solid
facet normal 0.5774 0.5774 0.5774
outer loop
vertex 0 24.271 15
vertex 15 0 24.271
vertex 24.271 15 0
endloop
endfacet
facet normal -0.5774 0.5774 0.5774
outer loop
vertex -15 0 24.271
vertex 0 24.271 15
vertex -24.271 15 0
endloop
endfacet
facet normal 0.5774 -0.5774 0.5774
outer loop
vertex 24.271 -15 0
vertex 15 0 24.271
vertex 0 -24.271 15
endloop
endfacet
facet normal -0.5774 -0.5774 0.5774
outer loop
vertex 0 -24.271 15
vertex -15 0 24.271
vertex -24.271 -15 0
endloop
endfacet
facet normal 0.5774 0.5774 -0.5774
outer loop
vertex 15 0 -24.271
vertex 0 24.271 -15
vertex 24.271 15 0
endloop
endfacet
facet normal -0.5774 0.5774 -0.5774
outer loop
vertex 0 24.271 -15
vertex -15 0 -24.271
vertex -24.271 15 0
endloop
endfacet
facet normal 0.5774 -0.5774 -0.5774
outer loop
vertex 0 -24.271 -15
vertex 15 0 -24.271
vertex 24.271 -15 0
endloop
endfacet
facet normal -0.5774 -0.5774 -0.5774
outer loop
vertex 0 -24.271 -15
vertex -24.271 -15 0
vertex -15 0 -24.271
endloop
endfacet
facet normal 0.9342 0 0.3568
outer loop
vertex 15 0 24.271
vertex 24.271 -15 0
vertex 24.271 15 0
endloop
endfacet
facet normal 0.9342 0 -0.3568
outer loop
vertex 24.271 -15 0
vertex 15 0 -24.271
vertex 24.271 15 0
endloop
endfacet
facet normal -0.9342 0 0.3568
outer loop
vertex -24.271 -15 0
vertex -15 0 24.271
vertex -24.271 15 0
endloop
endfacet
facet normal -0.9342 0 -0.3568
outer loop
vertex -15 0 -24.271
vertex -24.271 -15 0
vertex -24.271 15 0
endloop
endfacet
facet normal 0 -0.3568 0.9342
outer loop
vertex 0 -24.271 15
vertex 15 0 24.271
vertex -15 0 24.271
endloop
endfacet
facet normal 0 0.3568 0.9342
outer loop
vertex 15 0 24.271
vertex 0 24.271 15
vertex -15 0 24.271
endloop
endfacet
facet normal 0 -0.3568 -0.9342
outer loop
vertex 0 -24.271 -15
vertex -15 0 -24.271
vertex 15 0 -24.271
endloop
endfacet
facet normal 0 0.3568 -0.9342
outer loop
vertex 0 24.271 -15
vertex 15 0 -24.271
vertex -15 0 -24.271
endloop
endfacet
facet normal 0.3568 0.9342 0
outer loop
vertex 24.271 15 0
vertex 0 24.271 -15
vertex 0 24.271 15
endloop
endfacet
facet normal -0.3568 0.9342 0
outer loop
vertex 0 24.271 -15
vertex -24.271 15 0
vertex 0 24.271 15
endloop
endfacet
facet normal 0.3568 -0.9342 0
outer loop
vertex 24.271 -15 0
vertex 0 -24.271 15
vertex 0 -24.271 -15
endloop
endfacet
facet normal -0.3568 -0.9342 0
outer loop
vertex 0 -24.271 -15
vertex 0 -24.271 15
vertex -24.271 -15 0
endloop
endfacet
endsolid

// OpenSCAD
// Regular Icosahedron
// (C) @oblomobka - 2023.06
// GPL license

 /* **CUSTOMIZER VARIABLES** */
// Edge
edge = 30; //[10:100]
// Center of the solid or stand over a face
position = "Center"; //["Center", "Face"]

module IcosahedronRegular ( edge = 30, position = "Face"){ 
    // Constants
    phi = (1+sqrt(5))/2; // Golden ratio = 1,618...
    
    // Invariants
    diAngleIcosahedron = acos(-sqrt(5)/3); // dihedral angle of Icosahedron = 138,1897...
    
    // Relations
    rCirIcosahedron = sqrt(phi*sqrt(5))/2; // radius of a circumscribed sphere for edge = 1 / =0,951...
    rInsIcosahedron = phi^2/(2*sqrt(3)); // radius of a inscribed sphere for edge = 1 / =0,7558...
    rMidIcosahedron = phi/2; // Midradius, which touches the middle of each edge / =0,809...
    
    // Variables
    // longSide (a): shortSide (b) depicts the 3 rectangles (one in each plane (xy - xz - yz) to depict the 12 vertices of Icosahedron
    a = edge*phi/2;
    b = edge/2;
    
    // Definition of points and faces V = 12 / F = 20
    // 12 vertices -> Even permutations of ( +-phi, +-1, 0)
    Ipoints = [ 
        // Every line an auxiliar rectangle on planes XY/XZ/YZ
        [ +a, +b, 0], [ -a, +b, 0], [ +a, -b, 0], [ -a, -b, 0],         // XY [  0,  1,  2,  3]
        [ +b, 0, +a], [ -b, 0, +a], [ +b, 0, -a], [ -b, 0, -a],         // XZ [  4,  5,  6,  7]  
        [ 0, +a, +b], [ 0, -a, +b], [ 0, +a, -b], [ 0, -a, -b]          // YZ [  8,  9, 10, 11]
        ];
         
    Ifaces = [
        // Build 8 triangles. One triangle per octant
        [  0,  4,  8], [  1,  8,  5], [  9,  4,  2], [  3,  5,  9],     // UP
        [  0, 10,  6], [  1,  7, 10], [  2,  6, 11], [  7,  3, 11],     // DOWN
        // Pairs of triangles on shortSide of rectangles
        [  0,  2,  4], [  0,  6,  2], [  1,  5,  3], [  1,  3,  7],     // XY
        [  5,  4,  9], [  5,  8,  4], [  6,  7, 11], [  7,  6, 10],     // XZ
        [  8, 10,  0], [  8,  1, 10], [ 11,  9,  2], [  3,  9, 11]      // YZ
        ];
    
    // Polyhedron stands on xy plane centered on the center of the face or centered on the center of polyhedron
    if ( position == "Face"){
        translate ([ 0, 0, edge*rInsIcosahedron])
            rotate ([ 90-diAngleIcosahedron/2, 0, 0])
                polyhedron ( Ipoints, Ifaces);}
    else if ( position == "Center") {
        polyhedron ( Ipoints, Ifaces);} 
}

/* **RENDERING OF SOLIDS** */ 
IcosahedronRegular ( edge = edge, position = position);
